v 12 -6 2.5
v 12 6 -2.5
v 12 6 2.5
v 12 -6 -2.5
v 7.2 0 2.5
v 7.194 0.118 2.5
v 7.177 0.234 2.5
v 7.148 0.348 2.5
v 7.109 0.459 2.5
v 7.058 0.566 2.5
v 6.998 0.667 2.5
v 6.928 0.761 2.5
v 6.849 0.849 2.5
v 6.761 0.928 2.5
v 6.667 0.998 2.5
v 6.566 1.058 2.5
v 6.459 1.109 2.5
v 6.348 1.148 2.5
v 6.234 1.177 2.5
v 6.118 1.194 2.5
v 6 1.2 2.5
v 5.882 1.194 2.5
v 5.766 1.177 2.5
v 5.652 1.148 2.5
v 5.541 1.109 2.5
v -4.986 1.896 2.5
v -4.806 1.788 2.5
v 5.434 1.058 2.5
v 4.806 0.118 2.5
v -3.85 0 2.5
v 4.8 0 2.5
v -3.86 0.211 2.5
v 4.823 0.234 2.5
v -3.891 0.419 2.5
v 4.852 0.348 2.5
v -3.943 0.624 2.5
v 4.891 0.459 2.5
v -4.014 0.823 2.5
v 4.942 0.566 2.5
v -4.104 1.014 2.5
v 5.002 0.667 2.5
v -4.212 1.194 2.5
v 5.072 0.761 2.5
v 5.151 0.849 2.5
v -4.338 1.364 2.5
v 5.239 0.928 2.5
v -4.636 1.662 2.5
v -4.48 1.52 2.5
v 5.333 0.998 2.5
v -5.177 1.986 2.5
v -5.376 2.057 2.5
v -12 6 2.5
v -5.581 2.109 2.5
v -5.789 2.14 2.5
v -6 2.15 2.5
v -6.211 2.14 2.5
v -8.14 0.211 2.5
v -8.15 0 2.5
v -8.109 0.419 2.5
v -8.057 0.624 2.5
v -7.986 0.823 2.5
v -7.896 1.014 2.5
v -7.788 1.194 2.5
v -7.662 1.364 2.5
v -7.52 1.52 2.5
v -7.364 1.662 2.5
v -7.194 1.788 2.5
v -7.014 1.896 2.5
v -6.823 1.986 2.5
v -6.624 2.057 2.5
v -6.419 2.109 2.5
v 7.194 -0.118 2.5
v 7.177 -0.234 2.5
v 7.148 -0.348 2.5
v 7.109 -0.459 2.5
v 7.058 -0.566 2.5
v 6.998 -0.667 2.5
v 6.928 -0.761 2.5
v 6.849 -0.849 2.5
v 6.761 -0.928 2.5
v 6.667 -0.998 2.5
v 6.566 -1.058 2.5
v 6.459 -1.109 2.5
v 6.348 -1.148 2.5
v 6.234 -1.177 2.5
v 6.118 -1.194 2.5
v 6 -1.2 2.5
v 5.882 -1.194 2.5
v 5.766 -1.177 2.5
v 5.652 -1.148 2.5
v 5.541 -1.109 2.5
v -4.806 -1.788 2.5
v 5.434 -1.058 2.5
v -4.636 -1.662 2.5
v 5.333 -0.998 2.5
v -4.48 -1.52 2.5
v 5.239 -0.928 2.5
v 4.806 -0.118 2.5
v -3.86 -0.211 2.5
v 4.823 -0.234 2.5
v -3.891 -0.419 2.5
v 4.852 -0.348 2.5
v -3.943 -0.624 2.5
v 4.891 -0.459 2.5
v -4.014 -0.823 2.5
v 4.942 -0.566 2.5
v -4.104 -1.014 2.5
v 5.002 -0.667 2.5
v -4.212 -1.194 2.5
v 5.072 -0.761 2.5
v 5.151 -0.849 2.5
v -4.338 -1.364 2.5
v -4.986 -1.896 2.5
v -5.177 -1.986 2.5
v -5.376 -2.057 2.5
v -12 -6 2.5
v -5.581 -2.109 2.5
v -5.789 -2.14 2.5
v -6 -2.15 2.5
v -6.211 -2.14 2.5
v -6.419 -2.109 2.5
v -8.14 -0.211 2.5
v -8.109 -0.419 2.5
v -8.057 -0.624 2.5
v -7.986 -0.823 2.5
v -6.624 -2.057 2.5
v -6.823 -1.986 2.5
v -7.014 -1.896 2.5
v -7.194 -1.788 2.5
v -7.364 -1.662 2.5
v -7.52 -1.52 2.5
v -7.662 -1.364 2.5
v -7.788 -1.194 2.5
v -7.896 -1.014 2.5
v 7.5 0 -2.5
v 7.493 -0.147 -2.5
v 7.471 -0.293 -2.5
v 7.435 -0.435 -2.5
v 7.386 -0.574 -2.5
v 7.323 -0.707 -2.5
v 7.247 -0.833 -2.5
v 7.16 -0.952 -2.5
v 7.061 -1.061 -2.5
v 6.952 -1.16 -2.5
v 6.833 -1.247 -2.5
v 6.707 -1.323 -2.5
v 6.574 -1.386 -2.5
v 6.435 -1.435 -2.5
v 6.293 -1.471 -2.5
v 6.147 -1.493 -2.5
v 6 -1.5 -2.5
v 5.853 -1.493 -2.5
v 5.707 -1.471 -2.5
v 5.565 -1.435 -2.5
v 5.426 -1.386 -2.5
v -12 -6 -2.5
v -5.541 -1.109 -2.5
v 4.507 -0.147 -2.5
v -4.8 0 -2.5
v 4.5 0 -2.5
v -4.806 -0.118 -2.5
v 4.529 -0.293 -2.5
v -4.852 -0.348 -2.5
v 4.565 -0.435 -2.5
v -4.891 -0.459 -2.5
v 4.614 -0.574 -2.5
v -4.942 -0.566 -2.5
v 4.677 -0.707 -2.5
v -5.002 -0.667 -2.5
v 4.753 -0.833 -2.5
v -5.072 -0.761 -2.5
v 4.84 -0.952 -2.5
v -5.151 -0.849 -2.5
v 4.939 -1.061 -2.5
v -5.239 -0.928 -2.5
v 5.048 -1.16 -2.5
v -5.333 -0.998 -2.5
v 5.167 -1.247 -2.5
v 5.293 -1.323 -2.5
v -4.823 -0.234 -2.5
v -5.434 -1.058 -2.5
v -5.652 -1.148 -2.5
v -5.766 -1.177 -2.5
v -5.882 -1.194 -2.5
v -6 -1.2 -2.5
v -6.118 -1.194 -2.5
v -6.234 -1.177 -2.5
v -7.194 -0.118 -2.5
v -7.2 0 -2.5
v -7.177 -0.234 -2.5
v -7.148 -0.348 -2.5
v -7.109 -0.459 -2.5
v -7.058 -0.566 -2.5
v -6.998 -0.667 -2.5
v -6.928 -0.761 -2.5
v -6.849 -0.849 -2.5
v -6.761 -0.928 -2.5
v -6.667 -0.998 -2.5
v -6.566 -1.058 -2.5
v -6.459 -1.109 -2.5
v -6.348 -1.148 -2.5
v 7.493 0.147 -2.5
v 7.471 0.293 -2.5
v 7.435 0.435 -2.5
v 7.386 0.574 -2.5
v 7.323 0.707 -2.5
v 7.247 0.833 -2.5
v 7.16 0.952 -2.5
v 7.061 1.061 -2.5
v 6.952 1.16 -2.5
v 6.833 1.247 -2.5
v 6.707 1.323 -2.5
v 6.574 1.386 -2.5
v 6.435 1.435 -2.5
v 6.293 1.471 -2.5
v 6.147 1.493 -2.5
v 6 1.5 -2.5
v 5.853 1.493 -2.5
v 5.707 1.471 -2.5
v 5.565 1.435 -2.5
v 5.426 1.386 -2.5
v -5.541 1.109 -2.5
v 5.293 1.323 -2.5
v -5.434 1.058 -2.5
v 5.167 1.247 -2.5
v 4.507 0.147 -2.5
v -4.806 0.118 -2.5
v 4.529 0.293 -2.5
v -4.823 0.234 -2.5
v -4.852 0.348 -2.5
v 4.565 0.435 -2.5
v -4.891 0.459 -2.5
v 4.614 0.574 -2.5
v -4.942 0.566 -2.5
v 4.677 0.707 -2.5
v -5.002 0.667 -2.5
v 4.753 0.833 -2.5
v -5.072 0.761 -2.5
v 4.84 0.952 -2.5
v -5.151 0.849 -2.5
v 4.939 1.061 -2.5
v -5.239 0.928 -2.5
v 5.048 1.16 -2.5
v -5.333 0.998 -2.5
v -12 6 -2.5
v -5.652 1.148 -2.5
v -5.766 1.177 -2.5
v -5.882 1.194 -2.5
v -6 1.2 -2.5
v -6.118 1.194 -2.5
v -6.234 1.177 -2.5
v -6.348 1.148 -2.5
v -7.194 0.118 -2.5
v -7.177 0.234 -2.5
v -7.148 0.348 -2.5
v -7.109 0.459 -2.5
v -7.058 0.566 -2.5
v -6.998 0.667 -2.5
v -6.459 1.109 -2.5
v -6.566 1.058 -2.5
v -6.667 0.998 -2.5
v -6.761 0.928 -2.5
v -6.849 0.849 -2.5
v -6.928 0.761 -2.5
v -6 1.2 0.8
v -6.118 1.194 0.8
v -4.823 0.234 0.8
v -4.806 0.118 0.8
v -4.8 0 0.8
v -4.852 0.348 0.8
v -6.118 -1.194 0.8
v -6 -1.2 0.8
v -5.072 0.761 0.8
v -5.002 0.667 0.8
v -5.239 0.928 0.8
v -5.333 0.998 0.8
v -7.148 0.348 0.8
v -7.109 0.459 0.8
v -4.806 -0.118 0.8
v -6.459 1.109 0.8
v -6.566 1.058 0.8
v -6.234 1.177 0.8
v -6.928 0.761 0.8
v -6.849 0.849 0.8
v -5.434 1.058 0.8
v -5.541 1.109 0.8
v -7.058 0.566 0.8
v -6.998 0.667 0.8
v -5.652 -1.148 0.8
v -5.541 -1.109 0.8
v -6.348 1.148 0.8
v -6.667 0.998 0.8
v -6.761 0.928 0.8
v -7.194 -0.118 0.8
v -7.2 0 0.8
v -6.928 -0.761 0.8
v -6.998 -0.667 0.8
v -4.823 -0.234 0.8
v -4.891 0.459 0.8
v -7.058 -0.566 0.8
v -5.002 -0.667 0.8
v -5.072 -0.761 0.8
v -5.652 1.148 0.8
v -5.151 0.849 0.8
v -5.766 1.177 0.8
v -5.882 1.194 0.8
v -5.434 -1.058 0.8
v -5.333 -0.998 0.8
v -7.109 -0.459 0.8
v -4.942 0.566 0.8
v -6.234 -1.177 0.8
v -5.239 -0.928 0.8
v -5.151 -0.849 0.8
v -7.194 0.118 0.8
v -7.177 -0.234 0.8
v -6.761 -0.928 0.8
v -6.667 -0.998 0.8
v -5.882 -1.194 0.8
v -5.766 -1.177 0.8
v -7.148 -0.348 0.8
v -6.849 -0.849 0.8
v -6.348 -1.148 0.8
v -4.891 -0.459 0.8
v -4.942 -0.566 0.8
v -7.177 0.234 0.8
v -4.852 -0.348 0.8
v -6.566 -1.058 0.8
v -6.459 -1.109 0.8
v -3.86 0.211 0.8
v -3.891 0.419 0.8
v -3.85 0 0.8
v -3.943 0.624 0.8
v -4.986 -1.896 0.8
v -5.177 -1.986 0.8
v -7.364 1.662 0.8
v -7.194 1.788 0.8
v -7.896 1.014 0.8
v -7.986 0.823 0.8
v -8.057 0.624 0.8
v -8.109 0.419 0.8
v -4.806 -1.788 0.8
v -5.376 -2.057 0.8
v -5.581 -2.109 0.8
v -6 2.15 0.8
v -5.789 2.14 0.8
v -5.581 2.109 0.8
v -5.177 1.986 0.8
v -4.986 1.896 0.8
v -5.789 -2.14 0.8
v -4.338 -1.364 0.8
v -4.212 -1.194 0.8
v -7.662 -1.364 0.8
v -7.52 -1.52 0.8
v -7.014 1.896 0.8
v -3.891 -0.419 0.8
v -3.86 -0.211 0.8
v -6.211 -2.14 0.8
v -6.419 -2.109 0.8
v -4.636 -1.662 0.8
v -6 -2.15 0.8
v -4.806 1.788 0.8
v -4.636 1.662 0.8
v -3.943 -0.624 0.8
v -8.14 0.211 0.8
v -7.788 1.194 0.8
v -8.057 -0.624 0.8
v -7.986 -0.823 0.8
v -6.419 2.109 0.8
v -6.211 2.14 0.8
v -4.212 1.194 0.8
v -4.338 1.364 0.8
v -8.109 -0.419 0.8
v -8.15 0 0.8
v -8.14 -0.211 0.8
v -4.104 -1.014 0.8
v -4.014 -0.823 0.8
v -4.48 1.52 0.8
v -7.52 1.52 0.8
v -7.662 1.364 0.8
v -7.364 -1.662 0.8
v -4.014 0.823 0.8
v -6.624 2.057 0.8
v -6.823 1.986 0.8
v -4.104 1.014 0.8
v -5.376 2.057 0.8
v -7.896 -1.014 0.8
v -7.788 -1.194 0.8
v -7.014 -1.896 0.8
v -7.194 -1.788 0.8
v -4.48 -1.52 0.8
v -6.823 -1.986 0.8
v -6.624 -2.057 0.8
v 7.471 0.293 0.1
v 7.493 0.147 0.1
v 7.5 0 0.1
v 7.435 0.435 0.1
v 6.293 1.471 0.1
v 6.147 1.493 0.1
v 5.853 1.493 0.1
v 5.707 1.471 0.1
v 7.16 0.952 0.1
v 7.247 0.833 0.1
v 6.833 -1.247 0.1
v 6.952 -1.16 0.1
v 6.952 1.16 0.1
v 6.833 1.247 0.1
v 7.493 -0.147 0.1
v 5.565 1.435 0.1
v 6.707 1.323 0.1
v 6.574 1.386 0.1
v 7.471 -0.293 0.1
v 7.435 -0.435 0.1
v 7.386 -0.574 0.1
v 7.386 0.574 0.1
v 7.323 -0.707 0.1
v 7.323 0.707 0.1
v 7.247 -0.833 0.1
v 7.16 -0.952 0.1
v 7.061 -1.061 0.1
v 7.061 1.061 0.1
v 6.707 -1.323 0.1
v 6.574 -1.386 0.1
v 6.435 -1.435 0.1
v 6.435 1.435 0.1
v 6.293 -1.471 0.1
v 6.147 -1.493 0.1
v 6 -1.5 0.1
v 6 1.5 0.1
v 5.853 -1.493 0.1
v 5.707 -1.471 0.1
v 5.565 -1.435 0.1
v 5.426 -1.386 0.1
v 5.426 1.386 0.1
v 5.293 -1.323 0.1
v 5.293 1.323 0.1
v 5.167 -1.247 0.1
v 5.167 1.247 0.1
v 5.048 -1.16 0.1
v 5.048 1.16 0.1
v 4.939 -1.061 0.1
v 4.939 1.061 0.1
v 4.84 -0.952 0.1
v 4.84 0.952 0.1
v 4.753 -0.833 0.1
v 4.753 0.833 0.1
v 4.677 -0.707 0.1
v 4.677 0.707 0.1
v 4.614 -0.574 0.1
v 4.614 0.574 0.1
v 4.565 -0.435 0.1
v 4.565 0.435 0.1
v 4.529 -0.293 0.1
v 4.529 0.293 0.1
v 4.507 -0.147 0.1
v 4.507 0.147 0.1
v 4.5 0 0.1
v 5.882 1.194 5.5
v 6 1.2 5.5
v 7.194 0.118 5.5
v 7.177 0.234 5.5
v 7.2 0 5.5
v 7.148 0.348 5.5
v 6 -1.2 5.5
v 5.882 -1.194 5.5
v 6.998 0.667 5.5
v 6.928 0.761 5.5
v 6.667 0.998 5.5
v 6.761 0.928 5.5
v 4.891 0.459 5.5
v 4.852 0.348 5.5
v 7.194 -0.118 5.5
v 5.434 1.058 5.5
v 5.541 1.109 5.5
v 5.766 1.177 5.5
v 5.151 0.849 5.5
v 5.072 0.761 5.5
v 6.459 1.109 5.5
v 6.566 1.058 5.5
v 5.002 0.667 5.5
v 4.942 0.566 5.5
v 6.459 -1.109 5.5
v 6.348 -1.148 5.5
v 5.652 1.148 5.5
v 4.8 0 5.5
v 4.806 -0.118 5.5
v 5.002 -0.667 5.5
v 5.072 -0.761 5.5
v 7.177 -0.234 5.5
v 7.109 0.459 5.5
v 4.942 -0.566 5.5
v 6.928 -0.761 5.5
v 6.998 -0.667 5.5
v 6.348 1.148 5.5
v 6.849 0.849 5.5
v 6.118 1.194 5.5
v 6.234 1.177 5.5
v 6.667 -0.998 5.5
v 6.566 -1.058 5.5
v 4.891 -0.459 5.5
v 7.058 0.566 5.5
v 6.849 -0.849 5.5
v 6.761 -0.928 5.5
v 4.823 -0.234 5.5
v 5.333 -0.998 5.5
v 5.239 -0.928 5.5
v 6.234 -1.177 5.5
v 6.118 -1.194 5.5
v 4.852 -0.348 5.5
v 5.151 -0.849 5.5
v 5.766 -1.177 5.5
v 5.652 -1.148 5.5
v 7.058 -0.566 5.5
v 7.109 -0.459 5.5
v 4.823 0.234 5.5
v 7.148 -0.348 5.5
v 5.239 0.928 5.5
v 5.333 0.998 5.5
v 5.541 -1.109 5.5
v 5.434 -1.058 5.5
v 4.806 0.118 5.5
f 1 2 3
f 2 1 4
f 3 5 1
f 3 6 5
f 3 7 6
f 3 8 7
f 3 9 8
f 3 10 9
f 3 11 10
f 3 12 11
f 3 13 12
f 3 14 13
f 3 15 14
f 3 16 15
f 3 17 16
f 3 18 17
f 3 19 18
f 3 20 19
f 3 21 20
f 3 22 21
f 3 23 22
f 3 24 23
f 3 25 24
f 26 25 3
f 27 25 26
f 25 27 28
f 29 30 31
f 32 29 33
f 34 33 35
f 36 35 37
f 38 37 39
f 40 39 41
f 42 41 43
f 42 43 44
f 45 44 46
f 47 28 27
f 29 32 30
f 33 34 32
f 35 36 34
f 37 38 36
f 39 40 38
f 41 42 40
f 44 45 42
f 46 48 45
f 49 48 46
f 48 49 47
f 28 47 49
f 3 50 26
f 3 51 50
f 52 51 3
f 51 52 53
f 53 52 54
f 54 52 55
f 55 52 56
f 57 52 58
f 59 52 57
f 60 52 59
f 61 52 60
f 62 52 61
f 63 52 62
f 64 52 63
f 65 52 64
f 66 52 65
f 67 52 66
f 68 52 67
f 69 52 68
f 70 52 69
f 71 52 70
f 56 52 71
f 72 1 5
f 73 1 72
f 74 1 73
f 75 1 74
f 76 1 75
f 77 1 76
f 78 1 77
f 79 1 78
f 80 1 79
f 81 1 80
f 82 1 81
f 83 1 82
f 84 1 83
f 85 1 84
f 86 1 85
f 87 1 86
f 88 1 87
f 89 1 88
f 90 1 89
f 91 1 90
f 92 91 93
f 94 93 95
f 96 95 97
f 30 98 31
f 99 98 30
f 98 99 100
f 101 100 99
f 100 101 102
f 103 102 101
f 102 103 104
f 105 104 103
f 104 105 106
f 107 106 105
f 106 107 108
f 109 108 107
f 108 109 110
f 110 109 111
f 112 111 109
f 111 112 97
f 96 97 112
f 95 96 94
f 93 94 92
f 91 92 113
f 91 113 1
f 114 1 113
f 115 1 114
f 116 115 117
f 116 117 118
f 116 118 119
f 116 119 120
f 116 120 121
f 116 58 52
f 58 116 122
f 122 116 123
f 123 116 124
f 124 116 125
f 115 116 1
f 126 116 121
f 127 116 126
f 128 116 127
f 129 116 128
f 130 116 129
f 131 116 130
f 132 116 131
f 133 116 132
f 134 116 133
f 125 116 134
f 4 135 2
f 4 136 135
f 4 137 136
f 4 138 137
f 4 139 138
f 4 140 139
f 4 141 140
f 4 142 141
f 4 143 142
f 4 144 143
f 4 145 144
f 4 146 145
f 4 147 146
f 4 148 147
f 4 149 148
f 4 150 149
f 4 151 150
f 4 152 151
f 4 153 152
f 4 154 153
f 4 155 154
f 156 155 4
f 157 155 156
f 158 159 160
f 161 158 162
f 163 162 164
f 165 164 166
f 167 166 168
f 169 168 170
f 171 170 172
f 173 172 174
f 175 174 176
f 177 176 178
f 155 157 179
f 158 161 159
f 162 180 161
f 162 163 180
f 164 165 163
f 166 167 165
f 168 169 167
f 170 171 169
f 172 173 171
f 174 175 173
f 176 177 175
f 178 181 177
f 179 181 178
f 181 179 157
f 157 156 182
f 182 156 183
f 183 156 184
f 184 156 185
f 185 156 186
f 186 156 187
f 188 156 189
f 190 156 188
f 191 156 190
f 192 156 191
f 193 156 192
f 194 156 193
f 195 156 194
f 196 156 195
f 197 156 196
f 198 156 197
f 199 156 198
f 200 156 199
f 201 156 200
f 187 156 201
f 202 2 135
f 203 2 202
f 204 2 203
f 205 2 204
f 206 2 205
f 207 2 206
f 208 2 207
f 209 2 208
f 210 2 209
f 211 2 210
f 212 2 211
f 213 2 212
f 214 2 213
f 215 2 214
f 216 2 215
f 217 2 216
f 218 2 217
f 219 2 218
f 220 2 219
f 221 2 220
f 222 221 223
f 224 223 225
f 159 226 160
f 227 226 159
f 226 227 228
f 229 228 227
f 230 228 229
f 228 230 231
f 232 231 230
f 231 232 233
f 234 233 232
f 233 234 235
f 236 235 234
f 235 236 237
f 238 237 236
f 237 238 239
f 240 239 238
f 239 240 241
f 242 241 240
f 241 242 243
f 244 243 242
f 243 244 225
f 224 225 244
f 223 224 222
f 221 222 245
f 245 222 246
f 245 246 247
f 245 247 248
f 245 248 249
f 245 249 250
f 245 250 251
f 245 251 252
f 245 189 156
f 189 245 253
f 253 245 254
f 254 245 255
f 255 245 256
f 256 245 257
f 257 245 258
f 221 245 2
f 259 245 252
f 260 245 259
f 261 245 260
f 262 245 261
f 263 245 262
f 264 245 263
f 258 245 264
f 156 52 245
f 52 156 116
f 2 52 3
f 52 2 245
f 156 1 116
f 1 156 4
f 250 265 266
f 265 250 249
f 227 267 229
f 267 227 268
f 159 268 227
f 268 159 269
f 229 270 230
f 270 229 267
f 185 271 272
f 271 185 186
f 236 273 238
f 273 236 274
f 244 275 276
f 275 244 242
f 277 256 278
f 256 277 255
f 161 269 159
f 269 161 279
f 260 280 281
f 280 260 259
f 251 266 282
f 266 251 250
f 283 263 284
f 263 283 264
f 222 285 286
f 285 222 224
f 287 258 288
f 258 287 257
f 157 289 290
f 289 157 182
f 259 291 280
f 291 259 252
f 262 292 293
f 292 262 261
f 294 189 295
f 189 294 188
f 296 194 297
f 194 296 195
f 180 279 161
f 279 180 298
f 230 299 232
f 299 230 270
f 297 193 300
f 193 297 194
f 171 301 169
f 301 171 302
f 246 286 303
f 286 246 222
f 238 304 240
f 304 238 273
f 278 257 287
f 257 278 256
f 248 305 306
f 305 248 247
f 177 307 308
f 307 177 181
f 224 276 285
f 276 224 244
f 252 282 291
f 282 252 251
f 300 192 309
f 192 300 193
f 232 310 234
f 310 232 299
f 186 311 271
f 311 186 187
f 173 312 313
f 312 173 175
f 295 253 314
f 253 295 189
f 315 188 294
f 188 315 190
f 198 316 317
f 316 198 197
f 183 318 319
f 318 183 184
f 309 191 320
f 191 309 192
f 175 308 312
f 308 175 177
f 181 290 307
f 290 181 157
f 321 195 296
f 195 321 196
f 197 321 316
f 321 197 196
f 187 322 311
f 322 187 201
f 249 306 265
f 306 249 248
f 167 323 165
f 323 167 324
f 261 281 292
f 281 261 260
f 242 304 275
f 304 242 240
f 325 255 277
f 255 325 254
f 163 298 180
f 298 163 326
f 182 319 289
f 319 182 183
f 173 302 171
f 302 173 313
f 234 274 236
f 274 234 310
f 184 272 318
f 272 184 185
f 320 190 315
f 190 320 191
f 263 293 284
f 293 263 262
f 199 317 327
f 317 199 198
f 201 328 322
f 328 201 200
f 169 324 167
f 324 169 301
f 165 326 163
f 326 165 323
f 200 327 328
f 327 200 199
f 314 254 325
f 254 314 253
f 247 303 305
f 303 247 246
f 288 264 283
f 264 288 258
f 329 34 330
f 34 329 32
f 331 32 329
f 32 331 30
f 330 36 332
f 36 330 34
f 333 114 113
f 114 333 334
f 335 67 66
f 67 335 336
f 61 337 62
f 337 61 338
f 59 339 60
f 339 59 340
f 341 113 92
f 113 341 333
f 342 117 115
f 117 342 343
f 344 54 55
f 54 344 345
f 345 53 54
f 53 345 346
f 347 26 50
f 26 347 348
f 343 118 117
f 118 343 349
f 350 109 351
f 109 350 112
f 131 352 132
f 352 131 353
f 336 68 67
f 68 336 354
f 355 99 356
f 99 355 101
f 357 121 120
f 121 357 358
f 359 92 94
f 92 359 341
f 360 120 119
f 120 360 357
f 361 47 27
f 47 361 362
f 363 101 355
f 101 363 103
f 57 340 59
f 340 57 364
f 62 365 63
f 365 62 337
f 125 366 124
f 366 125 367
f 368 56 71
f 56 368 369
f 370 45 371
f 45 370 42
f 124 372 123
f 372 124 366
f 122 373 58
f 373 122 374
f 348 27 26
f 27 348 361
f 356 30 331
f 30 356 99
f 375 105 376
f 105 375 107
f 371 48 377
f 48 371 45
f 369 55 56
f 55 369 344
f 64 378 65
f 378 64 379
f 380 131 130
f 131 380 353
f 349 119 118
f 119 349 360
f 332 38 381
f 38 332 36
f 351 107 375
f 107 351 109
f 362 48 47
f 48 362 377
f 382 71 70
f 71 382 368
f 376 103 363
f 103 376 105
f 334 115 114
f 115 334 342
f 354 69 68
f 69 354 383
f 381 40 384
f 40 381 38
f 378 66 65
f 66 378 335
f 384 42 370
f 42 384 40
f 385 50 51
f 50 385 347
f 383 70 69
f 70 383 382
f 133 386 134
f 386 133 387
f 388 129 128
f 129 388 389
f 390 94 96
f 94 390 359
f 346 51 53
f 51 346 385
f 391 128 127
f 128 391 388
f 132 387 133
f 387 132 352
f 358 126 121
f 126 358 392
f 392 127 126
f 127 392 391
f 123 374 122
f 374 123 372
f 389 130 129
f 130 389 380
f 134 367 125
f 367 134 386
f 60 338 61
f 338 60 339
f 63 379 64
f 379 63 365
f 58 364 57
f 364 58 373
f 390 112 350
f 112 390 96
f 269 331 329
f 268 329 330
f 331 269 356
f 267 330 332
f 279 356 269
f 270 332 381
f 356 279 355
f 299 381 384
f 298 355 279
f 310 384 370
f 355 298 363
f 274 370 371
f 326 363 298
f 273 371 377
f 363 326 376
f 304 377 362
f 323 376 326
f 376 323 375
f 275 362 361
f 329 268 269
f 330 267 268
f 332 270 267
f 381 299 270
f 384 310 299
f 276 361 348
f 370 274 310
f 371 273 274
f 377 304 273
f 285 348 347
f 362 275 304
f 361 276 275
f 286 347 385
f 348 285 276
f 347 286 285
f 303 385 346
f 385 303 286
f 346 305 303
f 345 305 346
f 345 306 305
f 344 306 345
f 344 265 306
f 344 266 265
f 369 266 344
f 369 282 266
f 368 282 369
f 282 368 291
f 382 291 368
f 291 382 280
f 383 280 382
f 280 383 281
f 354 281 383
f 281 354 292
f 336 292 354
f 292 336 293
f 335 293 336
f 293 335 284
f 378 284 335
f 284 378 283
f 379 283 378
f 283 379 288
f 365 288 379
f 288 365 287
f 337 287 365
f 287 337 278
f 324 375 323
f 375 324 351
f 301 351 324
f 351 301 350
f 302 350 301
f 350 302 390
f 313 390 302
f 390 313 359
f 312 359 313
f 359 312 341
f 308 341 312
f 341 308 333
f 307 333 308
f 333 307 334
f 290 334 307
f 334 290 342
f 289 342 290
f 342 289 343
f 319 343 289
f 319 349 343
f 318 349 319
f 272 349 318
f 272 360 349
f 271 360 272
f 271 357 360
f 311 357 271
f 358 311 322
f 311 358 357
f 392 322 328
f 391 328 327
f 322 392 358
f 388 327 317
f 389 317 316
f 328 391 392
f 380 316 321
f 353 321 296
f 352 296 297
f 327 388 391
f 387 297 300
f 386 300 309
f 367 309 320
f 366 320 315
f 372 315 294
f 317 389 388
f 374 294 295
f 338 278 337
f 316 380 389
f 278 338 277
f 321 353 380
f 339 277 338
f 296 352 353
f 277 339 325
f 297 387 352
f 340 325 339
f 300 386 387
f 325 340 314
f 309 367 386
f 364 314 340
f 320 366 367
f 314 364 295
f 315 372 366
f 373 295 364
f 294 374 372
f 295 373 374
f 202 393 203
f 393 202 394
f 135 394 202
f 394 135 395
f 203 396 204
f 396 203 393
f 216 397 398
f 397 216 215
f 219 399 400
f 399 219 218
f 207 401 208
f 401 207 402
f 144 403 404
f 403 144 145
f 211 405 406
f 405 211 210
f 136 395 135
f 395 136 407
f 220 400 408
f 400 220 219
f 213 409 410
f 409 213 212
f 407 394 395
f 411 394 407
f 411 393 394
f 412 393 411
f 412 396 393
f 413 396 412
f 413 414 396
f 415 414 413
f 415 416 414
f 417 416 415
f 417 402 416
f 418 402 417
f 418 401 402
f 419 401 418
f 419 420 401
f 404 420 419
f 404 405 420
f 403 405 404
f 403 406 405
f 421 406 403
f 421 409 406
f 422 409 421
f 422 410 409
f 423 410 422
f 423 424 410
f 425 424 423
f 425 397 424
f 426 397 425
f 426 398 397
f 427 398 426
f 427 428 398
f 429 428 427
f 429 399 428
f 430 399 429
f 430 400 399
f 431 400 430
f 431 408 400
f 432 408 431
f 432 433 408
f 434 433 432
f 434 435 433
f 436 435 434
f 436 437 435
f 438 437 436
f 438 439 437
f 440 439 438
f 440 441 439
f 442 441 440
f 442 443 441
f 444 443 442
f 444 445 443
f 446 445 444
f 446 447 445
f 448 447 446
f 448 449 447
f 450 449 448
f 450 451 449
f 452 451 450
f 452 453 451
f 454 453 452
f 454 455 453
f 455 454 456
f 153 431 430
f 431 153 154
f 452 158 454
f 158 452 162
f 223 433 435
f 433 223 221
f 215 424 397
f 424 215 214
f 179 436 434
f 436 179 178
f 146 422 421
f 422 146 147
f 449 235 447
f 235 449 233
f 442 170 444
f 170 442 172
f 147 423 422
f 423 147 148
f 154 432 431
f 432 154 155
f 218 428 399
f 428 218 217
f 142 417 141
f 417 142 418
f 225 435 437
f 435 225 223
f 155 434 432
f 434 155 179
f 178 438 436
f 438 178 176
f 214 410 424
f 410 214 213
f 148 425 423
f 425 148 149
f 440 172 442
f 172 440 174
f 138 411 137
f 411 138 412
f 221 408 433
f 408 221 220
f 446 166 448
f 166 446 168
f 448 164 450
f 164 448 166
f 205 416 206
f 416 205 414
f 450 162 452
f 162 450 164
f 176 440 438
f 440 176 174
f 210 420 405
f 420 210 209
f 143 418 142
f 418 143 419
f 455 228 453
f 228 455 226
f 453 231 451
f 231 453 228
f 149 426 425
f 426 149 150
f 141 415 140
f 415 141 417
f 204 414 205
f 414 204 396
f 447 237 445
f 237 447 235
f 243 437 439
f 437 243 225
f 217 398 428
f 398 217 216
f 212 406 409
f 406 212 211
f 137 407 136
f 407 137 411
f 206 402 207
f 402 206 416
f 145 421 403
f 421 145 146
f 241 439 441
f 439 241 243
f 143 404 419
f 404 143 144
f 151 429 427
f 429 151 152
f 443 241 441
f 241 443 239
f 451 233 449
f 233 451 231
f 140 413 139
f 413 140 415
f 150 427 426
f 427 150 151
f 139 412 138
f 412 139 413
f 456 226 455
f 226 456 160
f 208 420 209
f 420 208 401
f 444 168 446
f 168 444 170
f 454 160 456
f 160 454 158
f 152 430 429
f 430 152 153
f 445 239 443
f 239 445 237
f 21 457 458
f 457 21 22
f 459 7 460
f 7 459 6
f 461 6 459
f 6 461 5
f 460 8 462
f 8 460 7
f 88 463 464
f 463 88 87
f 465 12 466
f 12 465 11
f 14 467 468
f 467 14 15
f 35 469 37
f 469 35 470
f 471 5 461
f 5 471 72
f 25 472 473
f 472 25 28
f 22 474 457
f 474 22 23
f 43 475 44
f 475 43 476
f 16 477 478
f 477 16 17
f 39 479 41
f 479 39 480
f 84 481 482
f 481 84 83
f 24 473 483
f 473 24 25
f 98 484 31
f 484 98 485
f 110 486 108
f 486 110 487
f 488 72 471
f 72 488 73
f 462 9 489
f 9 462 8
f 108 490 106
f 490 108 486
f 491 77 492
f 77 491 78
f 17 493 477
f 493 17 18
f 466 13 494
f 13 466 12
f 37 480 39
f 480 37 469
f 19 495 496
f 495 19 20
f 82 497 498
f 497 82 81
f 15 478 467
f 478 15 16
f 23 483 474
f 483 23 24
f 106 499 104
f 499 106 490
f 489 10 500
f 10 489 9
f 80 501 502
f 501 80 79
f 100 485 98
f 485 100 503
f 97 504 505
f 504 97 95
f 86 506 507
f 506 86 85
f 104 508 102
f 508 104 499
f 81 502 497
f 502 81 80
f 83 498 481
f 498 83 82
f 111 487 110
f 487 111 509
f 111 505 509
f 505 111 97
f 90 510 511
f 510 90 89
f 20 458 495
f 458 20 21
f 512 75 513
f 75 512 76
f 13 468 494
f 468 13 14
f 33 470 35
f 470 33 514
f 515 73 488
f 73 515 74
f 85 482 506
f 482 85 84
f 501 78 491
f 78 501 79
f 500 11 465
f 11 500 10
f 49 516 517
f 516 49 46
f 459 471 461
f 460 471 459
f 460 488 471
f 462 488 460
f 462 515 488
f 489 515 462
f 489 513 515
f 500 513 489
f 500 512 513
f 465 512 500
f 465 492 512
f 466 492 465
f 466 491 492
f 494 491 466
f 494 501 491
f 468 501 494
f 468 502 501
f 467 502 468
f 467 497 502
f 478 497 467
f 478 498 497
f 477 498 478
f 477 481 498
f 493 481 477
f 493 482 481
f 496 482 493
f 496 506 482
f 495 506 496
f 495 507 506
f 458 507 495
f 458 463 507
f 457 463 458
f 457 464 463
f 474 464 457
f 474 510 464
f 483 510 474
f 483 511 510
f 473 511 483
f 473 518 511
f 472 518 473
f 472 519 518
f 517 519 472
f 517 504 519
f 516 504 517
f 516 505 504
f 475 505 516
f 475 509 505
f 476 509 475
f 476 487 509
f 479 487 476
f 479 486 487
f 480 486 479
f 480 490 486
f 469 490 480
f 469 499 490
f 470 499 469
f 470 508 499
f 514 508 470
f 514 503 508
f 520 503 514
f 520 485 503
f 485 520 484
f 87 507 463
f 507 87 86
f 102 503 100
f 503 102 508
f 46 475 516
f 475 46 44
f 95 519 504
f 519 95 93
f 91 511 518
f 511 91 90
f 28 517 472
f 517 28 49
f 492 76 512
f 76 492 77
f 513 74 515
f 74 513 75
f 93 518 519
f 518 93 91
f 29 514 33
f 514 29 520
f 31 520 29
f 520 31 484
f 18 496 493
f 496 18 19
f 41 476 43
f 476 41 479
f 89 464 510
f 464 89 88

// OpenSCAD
// file: 55_stage1_print_parameters.scad
/* BUDDY FILE 55 - STAGE 1 PRINT / INTERFACE PARAMETERS
All dimensions mm. Values marked PROCESS are starting points for calibration coupons. */
B1_OD=115; B1_CAVITY_D=111; B1_AIRWAY_D=70; B1_DUCT_OD=74;
B1_SHELL_R=B1_OD/2; B1_CAVITY_R=B1_CAVITY_D/2;
B1_WALL=2.0; B1_MIN_RIB=2.2; B1_MIN_WEB=1.2;
B1_FDM_SLIDE=0.30;       // PROCESS: per side, calibrate
B1_FDM_PRESS=0.10;       // PROCESS: per side, calibrate
B1_INSERT_OD=3.2;        // PLACEHOLDER for M2-class heat-set insert; replace from selected insert drawing
B1_M2_CLEAR=2.4;         // PROCESS starting clearance
B1_M2_HEAD=4.3;          // PLACEHOLDER head pocket
B1_M2_HEAD_H=1.8;
B1_POLAR_OPENING_D=74.8;
B1_CAMERA_DUCT_GAP=0.8; B1_CAMERA_SHELL_MARGIN=1.0;
B1_ROTOR_NOMINAL_R=34.6; B1_ROTOR_STATIC_RADIAL_GAP=B1_AIRWAY_D/2-B1_ROTOR_NOMINAL_R;
assert(B1_OD==115); assert(B1_CAVITY_D==111); assert(B1_AIRWAY_D==70);
assert(B1_POLAR_OPENING_D>B1_DUCT_OD);
assert(B1_ROTOR_STATIC_RADIAL_GAP>0);
echo("FILE55 Stage1 architecture OD/cavity/airway =",B1_OD,B1_CAVITY_D,B1_AIRWAY_D);
echo("PROCESS tolerances require calibration before production prints");
// main file
/* BUDDY FILE63 - FASTENER + ALIGNMENT INTERFACE SYSTEM
Printable interface primitives for Stage1. Insert/head dimensions remain provisional until hardware is selected. */
include <55_stage1_print_parameters.scad>
$fn=64;
module insert_boss(h=5,wall=1.5){difference(){cylinder(h=h,d=B1_INSERT_OD+2*wall);translate([0,0,-.1])cylinder(h=h+.2,d=B1_INSERT_OD);}}
module screw_clearance(h=6){cylinder(h=h,d=B1_M2_CLEAR);}
module head_pocket(h=B1_M2_HEAD_H+.2){cylinder(h=h,d=B1_M2_HEAD);}
module alignment_pin(d=2.4,h=3){cylinder(h=h,d=d);}
module alignment_socket(d=2.4,h=3){cylinder(h=h+.1,d=d+2*B1_FDM_SLIDE);}
module interface_demo(){
 difference(){cube([24,12,5],center=true);translate([-6,0,-3])screw_clearance(6);translate([-6,0,0.8])head_pocket();translate([6,0,-3])alignment_socket();}
 translate([6,0,2.5])alignment_pin();
}
interface_demo();
echo("FILE63 interface system; calibrate File61 before relying on fits");
